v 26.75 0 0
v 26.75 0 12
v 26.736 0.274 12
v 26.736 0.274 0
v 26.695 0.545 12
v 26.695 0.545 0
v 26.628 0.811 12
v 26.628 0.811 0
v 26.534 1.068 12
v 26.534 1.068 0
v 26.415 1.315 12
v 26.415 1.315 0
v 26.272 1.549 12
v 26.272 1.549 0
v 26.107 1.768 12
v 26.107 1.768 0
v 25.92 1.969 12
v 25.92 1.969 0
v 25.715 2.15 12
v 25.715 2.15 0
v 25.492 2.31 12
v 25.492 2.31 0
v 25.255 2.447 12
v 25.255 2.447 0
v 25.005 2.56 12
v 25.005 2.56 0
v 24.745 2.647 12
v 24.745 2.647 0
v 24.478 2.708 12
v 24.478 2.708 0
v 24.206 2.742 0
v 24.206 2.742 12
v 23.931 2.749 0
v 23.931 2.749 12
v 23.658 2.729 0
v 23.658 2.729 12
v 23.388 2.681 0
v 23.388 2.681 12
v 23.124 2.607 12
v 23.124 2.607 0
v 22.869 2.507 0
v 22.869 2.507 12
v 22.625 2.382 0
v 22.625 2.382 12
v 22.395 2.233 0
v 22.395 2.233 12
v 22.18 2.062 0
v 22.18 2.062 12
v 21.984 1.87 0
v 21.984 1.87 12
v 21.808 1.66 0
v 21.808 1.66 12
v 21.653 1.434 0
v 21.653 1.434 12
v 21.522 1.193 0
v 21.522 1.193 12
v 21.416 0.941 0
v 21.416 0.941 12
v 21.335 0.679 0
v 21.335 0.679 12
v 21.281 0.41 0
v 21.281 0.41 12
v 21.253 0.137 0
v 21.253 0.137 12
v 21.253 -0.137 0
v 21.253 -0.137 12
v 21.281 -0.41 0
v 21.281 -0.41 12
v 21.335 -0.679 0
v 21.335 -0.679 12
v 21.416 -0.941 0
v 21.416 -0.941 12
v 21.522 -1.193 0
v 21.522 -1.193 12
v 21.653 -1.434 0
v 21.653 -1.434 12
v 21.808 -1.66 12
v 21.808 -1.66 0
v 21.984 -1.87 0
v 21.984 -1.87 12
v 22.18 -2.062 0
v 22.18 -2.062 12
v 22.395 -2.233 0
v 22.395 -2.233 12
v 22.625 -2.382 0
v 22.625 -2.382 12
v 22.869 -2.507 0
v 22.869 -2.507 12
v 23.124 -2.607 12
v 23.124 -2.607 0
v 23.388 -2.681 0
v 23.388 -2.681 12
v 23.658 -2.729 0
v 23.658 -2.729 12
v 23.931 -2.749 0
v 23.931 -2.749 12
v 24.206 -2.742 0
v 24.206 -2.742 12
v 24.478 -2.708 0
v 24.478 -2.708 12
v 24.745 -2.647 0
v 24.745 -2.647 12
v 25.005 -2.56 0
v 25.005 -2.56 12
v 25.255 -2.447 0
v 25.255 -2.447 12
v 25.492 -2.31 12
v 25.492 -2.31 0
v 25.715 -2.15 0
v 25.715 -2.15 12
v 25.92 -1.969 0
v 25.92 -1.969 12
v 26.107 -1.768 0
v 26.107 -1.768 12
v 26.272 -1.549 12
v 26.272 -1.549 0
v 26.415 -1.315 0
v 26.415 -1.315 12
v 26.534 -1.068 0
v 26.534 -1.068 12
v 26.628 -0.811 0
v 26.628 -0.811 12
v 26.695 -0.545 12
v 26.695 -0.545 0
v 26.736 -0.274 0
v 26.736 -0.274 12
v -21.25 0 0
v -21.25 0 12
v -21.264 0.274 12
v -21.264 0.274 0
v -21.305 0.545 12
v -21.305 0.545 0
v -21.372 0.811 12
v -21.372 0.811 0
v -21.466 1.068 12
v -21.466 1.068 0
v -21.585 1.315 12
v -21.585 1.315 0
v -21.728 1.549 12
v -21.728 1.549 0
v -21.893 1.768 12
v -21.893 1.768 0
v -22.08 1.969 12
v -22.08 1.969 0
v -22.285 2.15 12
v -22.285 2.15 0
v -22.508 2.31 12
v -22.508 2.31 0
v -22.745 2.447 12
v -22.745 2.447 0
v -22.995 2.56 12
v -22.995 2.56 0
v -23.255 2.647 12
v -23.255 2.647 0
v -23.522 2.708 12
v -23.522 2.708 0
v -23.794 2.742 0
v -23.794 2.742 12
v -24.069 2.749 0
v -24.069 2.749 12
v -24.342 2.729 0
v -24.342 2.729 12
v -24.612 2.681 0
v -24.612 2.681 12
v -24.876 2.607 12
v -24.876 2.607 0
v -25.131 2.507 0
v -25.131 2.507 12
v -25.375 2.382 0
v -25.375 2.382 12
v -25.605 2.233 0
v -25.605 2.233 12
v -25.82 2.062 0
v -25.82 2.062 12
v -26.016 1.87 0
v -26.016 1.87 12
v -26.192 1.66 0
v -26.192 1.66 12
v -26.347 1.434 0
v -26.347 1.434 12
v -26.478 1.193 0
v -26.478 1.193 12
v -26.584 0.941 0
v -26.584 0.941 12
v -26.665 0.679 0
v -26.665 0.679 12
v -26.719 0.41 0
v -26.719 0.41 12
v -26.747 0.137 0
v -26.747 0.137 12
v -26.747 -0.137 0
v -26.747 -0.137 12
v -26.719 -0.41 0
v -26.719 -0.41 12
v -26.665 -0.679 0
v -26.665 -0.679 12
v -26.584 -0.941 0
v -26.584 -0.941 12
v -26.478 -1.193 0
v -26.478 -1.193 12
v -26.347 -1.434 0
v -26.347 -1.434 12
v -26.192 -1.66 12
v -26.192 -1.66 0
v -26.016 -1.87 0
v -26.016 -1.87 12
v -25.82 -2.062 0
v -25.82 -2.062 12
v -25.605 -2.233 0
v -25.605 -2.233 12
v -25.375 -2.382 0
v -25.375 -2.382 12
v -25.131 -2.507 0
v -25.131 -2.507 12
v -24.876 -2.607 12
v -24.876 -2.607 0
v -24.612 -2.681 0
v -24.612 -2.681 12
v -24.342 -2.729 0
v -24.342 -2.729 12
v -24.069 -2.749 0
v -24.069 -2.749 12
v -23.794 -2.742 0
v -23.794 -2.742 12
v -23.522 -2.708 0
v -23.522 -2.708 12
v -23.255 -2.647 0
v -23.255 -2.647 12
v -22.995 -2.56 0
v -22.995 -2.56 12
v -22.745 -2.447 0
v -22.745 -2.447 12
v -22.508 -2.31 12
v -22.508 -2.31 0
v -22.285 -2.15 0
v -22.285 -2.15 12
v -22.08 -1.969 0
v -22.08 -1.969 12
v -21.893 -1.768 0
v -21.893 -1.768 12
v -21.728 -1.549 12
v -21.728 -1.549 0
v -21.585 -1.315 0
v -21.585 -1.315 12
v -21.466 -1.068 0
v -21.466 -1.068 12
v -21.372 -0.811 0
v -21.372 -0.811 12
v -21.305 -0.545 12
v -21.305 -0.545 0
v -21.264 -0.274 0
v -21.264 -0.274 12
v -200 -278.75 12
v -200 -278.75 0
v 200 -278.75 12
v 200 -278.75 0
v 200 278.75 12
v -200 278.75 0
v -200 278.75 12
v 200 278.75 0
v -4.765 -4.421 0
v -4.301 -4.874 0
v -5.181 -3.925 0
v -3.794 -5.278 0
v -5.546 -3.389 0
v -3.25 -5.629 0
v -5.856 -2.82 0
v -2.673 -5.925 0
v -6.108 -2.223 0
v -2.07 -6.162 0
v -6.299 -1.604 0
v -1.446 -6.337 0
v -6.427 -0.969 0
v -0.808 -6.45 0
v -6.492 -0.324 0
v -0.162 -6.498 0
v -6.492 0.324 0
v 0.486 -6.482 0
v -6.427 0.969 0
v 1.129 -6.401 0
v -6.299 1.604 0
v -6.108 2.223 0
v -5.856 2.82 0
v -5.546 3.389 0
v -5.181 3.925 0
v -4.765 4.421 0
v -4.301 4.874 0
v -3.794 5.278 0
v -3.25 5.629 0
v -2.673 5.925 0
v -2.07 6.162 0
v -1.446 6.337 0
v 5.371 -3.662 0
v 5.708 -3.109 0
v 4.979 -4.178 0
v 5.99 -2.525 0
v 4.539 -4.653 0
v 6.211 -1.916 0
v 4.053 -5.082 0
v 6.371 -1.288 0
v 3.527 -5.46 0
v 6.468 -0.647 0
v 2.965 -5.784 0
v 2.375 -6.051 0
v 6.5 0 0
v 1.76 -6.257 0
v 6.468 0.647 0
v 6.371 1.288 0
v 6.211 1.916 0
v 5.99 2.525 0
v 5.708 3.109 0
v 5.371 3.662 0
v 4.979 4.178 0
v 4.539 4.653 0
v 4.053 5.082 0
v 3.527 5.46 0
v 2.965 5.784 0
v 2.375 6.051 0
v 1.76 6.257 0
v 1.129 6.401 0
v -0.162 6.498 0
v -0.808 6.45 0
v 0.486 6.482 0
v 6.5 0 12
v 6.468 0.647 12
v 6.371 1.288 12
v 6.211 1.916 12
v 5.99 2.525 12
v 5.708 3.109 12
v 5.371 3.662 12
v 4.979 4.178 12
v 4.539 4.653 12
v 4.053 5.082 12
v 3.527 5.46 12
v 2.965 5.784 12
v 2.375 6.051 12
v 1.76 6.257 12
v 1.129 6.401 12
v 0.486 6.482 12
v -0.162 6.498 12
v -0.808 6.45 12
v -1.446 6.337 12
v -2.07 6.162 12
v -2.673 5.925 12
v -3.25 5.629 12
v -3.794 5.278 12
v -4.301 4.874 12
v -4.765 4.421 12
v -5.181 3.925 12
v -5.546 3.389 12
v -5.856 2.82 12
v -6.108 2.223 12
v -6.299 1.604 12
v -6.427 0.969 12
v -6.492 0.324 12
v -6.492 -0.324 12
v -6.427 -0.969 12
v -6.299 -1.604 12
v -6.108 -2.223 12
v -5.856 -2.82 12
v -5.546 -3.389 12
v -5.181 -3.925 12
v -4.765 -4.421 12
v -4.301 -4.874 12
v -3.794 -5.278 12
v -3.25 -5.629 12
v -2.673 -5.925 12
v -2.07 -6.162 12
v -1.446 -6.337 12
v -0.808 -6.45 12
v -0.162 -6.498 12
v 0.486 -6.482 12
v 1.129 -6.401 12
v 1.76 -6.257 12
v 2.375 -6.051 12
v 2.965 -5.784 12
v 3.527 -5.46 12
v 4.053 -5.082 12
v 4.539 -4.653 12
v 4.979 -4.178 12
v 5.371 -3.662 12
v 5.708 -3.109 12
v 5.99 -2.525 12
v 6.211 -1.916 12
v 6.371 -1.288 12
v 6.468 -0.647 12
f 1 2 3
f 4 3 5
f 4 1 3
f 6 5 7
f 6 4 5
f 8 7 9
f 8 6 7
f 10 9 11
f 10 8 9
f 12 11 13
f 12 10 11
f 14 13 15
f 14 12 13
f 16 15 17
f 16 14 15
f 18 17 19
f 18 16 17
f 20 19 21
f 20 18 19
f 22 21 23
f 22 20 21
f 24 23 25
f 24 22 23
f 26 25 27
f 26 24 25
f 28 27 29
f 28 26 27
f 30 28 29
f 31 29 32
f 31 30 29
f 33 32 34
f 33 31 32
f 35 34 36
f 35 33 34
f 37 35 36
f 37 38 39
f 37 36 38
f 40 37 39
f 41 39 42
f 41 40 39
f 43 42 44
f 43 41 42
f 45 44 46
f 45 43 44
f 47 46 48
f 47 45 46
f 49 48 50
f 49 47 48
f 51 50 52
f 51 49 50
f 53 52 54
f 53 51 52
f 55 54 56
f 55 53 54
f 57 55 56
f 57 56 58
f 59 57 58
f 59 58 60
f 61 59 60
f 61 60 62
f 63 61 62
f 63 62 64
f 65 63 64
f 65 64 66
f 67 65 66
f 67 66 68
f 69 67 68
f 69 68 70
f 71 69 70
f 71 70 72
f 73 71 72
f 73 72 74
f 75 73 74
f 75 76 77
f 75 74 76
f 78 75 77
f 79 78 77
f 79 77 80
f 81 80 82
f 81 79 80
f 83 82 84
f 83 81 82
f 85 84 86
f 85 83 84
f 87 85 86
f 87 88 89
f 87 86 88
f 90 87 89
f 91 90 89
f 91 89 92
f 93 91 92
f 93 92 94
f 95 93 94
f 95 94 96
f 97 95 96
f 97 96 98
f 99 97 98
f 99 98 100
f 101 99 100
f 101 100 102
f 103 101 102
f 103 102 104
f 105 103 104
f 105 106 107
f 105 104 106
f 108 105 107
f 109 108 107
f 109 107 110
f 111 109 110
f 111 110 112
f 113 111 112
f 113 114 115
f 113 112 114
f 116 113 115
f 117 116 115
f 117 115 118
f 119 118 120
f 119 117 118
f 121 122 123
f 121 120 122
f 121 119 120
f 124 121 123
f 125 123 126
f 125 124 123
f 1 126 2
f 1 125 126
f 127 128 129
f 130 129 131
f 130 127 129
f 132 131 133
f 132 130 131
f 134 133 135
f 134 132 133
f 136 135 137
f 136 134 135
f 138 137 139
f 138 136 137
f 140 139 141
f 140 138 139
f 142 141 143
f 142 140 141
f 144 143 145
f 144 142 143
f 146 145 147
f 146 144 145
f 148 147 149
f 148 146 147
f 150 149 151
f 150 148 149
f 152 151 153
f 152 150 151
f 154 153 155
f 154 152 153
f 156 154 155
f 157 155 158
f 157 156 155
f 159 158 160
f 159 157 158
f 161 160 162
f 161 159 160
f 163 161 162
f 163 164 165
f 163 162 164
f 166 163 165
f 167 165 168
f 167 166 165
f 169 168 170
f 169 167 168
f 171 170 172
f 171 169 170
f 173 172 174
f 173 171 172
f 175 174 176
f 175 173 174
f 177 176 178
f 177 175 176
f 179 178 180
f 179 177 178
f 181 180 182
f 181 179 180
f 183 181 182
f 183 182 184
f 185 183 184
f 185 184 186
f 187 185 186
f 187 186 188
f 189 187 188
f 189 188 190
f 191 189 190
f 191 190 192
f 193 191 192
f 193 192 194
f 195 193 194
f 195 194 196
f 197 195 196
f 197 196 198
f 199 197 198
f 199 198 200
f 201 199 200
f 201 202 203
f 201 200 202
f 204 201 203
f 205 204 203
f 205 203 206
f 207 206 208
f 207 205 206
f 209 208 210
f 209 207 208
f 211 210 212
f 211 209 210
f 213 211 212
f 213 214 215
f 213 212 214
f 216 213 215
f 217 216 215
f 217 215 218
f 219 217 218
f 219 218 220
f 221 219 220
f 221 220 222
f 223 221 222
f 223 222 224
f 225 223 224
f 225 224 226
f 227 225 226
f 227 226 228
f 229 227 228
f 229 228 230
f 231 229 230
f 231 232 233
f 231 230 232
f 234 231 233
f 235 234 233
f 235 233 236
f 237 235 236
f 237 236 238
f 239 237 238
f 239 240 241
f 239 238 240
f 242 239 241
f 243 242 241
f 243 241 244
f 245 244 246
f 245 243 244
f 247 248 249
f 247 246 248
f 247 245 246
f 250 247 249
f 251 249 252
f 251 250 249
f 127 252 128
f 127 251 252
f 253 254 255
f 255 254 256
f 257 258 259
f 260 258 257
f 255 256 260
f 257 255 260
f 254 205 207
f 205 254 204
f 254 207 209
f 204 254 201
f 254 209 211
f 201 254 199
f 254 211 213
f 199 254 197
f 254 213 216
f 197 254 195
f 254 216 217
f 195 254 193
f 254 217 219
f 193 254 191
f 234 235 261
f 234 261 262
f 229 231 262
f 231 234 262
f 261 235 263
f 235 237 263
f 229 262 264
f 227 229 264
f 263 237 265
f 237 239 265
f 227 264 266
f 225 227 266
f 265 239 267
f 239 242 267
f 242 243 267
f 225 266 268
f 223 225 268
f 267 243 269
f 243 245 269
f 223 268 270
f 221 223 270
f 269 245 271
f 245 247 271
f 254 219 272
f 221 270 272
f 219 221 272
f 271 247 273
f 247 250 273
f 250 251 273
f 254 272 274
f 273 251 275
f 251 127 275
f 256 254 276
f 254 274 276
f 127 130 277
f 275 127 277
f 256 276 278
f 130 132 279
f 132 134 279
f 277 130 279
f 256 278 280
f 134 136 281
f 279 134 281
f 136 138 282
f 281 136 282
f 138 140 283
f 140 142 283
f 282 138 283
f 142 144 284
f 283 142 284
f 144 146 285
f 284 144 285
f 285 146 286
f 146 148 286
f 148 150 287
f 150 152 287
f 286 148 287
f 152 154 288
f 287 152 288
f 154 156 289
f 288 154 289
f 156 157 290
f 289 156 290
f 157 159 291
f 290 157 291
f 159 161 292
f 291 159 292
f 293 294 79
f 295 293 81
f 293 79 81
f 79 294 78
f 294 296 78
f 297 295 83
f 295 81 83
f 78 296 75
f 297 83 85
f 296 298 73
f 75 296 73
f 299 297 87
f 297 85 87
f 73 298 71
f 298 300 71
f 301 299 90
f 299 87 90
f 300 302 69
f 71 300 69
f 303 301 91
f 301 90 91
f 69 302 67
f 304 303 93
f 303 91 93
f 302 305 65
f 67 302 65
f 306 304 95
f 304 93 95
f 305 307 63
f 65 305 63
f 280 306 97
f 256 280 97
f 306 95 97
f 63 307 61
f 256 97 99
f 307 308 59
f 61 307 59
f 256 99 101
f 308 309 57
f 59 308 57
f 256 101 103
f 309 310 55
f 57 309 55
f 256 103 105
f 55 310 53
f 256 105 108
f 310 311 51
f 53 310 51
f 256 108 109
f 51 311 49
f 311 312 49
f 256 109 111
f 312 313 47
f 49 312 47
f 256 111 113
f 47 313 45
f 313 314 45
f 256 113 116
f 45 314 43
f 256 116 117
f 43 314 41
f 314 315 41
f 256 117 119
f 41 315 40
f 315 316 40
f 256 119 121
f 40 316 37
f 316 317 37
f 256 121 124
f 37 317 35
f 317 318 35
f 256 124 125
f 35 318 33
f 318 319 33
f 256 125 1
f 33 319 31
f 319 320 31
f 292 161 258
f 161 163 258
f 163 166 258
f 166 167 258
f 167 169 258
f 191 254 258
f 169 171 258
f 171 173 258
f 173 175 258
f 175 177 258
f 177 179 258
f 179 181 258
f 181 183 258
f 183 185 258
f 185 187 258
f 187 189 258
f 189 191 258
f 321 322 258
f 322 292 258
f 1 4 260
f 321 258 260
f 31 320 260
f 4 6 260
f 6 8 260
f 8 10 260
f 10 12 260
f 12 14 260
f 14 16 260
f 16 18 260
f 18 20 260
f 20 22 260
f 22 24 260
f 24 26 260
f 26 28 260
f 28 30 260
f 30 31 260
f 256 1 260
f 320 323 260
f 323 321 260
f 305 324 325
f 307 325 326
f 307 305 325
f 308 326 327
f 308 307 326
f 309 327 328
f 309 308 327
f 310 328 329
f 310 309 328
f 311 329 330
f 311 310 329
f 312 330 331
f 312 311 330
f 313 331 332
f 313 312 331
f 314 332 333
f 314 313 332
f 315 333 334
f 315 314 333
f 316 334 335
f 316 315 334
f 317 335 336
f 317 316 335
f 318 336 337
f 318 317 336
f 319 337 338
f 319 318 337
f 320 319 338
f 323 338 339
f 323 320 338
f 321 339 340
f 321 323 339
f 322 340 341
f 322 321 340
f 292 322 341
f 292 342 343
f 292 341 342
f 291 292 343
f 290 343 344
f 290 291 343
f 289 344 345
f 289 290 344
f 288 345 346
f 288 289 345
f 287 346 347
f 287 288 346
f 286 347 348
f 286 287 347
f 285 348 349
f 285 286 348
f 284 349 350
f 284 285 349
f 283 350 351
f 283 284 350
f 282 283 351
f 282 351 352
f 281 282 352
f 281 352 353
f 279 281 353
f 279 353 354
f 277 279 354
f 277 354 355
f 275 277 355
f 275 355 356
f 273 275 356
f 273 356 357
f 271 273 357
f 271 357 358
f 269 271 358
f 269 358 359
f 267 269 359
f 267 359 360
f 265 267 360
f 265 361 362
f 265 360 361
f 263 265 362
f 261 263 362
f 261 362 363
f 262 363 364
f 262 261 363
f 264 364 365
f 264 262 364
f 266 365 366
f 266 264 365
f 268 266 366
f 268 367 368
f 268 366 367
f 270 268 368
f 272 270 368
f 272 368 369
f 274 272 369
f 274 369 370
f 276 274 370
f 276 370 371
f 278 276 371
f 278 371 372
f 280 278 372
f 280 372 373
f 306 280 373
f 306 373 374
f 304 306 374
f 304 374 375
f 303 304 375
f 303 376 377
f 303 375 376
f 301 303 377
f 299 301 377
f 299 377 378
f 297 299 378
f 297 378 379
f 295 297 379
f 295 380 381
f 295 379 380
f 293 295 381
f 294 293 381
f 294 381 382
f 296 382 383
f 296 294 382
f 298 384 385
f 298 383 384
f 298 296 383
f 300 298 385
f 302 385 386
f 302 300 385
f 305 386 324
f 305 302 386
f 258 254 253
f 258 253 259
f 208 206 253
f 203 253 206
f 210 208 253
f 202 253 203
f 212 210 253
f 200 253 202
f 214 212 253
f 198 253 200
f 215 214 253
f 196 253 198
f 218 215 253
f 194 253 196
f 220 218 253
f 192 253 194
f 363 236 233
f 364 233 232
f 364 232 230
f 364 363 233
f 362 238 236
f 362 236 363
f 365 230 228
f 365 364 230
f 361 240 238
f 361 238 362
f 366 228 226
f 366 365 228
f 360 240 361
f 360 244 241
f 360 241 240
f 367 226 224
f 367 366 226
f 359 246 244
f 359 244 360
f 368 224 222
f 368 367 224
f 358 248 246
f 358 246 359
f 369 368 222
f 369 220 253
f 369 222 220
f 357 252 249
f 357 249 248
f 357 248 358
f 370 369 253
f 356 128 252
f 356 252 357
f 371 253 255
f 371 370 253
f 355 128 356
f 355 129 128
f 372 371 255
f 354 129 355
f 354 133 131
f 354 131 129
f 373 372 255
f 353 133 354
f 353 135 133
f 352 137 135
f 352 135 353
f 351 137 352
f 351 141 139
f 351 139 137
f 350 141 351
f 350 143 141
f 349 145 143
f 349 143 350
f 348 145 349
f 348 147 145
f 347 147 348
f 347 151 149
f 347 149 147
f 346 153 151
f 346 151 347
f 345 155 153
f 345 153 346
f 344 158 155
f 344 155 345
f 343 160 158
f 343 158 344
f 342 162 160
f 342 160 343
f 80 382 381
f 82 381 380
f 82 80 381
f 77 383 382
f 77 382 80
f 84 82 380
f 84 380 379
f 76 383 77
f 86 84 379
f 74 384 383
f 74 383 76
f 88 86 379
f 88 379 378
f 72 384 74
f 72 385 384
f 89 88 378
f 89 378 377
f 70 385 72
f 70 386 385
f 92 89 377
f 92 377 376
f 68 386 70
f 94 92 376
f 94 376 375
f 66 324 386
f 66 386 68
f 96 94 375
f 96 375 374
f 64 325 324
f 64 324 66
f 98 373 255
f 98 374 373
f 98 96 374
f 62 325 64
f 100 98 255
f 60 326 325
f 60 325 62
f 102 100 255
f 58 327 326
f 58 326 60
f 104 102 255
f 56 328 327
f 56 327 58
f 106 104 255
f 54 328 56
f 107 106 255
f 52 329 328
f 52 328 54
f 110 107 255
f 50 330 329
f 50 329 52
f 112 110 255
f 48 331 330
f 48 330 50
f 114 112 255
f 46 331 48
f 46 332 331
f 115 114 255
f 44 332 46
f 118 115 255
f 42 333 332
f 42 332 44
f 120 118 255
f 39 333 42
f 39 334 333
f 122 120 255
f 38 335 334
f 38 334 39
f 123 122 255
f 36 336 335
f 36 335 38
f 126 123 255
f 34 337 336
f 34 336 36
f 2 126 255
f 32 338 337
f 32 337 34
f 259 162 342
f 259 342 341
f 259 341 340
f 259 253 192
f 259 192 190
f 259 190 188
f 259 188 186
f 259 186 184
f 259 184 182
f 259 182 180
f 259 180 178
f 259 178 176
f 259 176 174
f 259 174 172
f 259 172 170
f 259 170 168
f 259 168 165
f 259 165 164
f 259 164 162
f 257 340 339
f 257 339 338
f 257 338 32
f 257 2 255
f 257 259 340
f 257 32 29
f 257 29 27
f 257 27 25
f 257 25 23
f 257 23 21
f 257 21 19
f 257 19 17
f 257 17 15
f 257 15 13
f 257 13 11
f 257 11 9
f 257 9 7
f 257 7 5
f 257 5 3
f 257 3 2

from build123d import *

# Parameters (mm, degrees)
SKETCH020_W     = 400
SKETCH020_H     = 557.5
PAD008_DEPTH    = 12
SKETCH021_R     = 6.5
POCKET005_DEPTH = 12.001
SKETCH039_R     = 2.75
HOLE006_DEPTH   = 1386.241465


with BuildPart() as part:
    # Sketch020 → Pad008 (new body)
    with BuildSketch(Plane.XY):
        Rectangle(SKETCH020_W, SKETCH020_H)
    extrude(amount=PAD008_DEPTH)

    # Sketch021 → Pocket005 (cut, through all)
    with BuildSketch(Plane.XY):
        Circle(SKETCH021_R)
    extrude(amount=POCKET005_DEPTH, mode=Mode.SUBTRACT)

    # Sketch039 → Hole006 (cut)
    with BuildSketch(Plane.XY):
        with Locations((-24, 0)):
            Circle(SKETCH039_R)
        with Locations((24, 0)):
            Circle(SKETCH039_R)
    extrude(amount=HOLE006_DEPTH, mode=Mode.SUBTRACT)


solid = part.part
